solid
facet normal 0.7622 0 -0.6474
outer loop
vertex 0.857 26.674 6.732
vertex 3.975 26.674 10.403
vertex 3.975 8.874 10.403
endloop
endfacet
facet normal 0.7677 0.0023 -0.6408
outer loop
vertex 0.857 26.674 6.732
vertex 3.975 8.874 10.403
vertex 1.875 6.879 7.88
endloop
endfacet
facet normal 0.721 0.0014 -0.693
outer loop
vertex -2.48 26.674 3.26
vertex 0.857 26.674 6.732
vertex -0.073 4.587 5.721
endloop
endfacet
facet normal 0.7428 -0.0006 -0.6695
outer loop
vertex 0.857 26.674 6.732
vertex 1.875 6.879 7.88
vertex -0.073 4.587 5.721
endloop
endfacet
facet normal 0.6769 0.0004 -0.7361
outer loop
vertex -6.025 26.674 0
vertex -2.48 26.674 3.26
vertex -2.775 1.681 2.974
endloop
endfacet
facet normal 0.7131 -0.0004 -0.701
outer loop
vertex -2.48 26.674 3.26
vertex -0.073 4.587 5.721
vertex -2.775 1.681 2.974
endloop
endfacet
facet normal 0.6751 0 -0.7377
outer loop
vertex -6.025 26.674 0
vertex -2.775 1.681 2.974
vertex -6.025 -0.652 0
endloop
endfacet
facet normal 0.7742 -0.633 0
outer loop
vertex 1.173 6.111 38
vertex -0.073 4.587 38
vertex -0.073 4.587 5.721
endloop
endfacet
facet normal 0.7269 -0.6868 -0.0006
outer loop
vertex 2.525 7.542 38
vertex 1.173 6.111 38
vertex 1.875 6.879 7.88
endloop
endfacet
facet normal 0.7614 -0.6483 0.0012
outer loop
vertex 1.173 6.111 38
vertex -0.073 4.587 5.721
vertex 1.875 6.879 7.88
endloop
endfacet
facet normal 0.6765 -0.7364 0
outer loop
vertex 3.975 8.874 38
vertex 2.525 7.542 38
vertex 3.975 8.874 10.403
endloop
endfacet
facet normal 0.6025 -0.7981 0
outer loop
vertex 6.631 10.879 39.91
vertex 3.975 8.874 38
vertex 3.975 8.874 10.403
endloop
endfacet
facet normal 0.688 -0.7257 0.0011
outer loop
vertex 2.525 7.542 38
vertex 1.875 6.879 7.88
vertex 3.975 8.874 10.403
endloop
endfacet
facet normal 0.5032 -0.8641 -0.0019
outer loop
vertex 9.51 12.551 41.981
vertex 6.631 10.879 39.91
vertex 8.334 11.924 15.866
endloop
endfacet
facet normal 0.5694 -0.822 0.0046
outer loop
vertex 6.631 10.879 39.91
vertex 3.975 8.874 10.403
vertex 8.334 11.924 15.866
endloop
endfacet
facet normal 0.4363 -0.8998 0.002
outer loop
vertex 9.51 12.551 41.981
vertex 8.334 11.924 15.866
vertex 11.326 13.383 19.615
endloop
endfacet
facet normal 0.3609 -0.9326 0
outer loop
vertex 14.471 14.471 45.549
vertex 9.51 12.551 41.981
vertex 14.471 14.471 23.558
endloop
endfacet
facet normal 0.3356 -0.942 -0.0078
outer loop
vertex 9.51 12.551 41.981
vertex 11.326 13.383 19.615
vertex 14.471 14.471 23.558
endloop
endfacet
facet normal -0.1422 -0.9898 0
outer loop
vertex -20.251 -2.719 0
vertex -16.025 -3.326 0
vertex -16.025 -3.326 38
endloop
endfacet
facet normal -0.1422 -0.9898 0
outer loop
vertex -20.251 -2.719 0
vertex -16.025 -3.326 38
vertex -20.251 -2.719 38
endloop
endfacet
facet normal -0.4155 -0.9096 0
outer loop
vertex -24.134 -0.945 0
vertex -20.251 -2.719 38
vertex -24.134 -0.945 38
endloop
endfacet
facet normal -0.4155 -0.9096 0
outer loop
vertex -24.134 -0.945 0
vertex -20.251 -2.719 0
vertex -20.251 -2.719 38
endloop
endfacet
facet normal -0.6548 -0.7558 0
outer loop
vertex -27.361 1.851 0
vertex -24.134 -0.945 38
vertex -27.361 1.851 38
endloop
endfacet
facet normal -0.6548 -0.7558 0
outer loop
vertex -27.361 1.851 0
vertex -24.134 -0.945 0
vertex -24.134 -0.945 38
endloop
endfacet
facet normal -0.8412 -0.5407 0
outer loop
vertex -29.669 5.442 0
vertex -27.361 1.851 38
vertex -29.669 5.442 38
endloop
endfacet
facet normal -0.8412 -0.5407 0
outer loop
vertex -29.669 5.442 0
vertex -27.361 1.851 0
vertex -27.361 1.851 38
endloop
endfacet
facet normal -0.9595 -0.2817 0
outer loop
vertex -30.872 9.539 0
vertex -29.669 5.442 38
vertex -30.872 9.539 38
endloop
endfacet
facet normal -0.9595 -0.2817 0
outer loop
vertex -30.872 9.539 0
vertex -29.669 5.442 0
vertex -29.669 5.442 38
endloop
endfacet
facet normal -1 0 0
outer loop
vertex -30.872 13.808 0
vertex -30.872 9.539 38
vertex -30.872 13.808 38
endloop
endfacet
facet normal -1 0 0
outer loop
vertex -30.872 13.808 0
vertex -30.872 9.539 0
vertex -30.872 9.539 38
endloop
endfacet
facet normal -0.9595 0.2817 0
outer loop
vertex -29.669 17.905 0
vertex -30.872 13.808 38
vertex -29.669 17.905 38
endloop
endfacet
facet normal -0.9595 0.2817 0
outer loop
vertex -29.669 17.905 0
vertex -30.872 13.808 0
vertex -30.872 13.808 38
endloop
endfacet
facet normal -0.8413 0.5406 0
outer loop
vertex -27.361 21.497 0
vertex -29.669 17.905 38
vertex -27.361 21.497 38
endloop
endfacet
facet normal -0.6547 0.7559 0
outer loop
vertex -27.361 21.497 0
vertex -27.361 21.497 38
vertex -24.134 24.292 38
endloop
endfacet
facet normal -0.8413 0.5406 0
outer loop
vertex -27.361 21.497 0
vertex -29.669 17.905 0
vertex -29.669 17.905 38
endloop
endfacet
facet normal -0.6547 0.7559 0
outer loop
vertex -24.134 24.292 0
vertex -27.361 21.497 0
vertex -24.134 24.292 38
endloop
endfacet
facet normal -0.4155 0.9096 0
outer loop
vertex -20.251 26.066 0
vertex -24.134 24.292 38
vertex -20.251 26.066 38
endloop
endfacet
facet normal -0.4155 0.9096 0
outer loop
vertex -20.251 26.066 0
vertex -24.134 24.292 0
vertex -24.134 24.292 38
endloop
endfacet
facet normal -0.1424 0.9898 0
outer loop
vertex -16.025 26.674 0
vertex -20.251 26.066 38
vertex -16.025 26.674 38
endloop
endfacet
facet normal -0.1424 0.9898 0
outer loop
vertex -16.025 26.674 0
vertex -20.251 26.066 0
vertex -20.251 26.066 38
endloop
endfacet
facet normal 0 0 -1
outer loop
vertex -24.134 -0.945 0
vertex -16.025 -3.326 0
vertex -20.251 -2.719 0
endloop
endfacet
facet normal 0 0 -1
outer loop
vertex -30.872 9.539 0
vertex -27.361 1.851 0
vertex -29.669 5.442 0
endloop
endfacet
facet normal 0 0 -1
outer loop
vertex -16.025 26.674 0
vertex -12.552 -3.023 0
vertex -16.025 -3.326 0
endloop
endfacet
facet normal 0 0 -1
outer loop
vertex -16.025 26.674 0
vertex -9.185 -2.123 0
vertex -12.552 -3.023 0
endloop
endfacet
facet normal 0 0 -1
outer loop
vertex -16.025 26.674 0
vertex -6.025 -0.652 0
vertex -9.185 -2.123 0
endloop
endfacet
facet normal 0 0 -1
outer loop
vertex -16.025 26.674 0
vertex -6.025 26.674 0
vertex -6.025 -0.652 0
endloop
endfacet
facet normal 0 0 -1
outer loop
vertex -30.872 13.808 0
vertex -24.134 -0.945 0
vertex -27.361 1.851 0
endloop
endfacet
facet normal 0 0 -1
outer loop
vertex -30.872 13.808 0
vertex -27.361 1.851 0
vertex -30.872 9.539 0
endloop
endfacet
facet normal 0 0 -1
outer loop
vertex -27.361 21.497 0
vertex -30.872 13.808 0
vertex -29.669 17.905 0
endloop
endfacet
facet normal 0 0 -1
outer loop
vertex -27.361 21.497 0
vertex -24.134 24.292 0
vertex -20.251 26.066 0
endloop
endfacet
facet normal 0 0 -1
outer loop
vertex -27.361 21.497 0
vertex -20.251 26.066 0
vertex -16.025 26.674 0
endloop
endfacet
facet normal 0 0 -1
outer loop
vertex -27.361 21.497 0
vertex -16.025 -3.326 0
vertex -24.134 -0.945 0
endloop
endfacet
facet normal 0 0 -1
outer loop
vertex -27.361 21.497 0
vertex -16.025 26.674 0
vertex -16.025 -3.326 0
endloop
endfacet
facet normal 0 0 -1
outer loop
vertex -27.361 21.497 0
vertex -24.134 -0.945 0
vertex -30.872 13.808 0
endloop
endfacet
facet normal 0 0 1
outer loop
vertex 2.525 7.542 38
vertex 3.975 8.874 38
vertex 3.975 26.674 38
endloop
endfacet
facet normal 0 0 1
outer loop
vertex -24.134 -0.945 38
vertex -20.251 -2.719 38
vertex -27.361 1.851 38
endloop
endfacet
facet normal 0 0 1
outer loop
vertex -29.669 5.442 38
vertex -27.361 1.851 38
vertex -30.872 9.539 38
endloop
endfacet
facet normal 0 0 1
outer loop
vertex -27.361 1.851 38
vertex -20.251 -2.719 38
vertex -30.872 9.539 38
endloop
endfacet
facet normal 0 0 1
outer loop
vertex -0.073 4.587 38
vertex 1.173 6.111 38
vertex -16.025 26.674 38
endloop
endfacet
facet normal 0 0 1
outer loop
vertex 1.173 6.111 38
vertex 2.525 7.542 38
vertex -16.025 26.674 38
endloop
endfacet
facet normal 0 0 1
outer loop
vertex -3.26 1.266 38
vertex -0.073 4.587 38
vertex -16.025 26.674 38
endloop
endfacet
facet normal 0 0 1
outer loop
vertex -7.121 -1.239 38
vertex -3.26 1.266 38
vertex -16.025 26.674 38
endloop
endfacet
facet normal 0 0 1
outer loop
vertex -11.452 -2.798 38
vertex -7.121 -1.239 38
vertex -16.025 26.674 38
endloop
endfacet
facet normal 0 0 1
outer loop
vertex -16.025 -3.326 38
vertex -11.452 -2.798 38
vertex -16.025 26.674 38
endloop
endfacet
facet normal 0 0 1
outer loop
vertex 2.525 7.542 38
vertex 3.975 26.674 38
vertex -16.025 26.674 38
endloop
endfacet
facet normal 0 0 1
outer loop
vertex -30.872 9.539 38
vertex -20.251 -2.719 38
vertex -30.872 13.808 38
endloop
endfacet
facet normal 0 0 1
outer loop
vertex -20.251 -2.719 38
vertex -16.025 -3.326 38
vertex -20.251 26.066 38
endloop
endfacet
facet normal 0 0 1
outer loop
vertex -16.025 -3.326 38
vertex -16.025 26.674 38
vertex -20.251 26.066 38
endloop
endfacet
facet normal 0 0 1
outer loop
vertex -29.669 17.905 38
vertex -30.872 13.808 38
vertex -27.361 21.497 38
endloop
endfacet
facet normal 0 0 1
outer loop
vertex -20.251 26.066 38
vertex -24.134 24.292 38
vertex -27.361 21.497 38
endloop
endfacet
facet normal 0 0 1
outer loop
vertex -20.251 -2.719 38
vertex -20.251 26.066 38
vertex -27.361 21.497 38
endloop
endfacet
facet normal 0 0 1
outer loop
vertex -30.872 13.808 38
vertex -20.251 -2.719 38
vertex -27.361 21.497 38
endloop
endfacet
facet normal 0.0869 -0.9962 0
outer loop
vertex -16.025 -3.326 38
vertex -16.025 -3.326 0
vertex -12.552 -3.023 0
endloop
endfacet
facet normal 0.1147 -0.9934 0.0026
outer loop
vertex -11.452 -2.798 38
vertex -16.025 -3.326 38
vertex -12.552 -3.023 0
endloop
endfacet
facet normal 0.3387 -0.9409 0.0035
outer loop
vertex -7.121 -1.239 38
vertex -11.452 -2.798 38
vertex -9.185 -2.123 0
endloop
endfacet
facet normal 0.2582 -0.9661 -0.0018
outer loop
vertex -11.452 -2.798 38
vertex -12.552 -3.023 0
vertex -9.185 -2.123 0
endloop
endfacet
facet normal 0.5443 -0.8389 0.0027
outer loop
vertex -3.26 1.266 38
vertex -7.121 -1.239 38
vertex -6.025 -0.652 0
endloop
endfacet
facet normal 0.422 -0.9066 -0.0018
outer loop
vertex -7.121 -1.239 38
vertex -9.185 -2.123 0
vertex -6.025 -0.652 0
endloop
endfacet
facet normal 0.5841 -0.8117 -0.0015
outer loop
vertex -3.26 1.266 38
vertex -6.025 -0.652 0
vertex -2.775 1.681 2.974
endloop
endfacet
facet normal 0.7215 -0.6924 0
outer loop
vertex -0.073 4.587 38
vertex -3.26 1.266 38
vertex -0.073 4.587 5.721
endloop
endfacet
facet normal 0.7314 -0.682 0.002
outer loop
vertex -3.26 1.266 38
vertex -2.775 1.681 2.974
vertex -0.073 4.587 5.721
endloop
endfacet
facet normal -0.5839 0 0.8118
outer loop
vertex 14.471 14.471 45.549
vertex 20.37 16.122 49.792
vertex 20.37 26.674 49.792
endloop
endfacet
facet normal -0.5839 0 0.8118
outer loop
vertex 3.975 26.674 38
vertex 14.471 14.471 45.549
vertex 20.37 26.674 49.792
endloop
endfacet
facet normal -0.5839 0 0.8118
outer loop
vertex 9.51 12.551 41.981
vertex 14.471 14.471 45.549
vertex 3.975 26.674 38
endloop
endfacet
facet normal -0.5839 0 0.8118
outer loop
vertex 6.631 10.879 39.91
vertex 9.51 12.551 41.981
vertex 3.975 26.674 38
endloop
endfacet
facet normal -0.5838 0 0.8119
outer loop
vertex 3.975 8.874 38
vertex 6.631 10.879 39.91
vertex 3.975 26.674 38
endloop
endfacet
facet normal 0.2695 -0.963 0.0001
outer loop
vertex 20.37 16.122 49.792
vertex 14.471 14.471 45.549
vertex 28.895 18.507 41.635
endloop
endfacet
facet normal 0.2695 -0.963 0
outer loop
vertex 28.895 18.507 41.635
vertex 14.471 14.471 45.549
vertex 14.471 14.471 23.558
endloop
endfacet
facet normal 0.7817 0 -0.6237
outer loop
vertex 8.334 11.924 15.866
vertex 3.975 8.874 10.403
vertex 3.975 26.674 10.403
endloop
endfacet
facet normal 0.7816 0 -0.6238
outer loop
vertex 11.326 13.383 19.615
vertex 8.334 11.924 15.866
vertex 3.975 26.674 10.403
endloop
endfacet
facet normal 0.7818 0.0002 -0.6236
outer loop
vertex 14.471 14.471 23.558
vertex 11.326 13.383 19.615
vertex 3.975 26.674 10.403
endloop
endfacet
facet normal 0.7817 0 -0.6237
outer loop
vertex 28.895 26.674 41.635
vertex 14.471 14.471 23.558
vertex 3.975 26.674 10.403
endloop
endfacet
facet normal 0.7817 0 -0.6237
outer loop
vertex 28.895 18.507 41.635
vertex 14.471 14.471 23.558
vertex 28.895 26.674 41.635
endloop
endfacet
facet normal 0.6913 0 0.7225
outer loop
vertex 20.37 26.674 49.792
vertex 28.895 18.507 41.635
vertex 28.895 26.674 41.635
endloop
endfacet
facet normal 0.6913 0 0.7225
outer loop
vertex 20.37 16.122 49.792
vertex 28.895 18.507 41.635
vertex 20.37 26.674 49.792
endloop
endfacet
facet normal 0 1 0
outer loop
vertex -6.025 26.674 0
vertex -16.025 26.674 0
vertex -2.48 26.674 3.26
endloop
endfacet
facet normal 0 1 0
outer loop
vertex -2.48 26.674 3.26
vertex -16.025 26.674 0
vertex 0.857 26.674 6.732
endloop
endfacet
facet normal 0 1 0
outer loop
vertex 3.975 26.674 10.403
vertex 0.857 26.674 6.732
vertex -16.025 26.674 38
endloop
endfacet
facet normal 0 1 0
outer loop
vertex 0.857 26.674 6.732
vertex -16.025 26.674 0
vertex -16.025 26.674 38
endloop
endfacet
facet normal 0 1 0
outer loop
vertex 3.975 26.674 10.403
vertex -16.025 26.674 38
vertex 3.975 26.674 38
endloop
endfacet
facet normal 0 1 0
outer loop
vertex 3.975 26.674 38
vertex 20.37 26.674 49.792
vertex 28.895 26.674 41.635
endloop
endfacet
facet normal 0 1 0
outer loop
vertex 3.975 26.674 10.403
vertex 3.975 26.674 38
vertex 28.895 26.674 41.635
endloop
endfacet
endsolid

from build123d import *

# Parameters (mm, degrees)
BOSS_EXTRUDE1_DEPTH = 38
BOSS_EXTRUDE3_DEPTH = 30
CUT_EXTRUDE2_DEPTH  = 61
CUT_EXTRUDE1_DEPTH  = 61


with BuildPart() as part:
    # Sketch1 → Boss-Extrude1 (new body)
    with BuildSketch(Plane.XY):
        with BuildLine():
            Line((-16.024694199, 26.673676157), (3.975305801, 26.673676157))
            Line((3.975305801, 26.673676157), (3.975305801, -3.326323843))
            Line((3.975305801, -3.326323843), (-16.024694199, -3.326323843))
            ThreePointArc((-16.024694199, -3.326323843), (-31.024694199, 11.673676157), (-16.024694199, 26.673676157))
        make_face()
    extrude(amount=BOSS_EXTRUDE1_DEPTH)

    # Sketch2 → Boss-Extrude3 (add)
    with BuildSketch(Plane.XZ.offset(3.326323843)):
        Polygon((3.975305801, 38), (3.975305801, 10.402664479), (28.894576723, 41.635004813), (20.3703899, 49.791936592), align=None)
    extrude(amount=-BOSS_EXTRUDE3_DEPTH)

    # Sketch4 → Cut-Extrude2 (cut)
    with BuildSketch(Plane.XZ.offset(3.326323843)):
        with BuildLine():
            Line((-6.024694199, 0), (8.586429147, -30.750559355))
            Line((8.586429147, -30.750559355), (53.639483602, 0))
            Line((53.639483602, 0), (3.975305801, 10.402664479))
            ThreePointArc((3.975305801, 10.402664479), (-0.784676233, 4.970604847), (-6.024694199, 0))
        make_face()
    extrude(amount=-CUT_EXTRUDE2_DEPTH, mode=Mode.SUBTRACT)

    # Sketch3 → Cut-Extrude1 (cut)
    with BuildSketch(Plane(origin=(0, 0, 0), x_dir=(-1, 0, 0), z_dir=(0, 0, -1))):
        with BuildLine():
            Line((-14.471237169, 14.471119338), (-28.894576723, 18.506537052))
            Line((-28.894576723, 18.506537052), (-57.421554234, 26.725830047))
            Line((-57.421554234, 26.725830047), (-3.301256906, -44.718260526))
            Line((-3.301256906, -44.718260526), (16.024694199, -3.326323843))
            ThreePointArc((16.024694199, -3.326323843), (7.12126065, -1.239294), (0.072764407, 4.586984677))
            ThreePointArc((0.072764407, 4.586984677), (-6.391299116, 10.717890613), (-14.471237169, 14.471119338))
        make_face()
    extrude(amount=-CUT_EXTRUDE1_DEPTH, mode=Mode.SUBTRACT)


solid = part.part
